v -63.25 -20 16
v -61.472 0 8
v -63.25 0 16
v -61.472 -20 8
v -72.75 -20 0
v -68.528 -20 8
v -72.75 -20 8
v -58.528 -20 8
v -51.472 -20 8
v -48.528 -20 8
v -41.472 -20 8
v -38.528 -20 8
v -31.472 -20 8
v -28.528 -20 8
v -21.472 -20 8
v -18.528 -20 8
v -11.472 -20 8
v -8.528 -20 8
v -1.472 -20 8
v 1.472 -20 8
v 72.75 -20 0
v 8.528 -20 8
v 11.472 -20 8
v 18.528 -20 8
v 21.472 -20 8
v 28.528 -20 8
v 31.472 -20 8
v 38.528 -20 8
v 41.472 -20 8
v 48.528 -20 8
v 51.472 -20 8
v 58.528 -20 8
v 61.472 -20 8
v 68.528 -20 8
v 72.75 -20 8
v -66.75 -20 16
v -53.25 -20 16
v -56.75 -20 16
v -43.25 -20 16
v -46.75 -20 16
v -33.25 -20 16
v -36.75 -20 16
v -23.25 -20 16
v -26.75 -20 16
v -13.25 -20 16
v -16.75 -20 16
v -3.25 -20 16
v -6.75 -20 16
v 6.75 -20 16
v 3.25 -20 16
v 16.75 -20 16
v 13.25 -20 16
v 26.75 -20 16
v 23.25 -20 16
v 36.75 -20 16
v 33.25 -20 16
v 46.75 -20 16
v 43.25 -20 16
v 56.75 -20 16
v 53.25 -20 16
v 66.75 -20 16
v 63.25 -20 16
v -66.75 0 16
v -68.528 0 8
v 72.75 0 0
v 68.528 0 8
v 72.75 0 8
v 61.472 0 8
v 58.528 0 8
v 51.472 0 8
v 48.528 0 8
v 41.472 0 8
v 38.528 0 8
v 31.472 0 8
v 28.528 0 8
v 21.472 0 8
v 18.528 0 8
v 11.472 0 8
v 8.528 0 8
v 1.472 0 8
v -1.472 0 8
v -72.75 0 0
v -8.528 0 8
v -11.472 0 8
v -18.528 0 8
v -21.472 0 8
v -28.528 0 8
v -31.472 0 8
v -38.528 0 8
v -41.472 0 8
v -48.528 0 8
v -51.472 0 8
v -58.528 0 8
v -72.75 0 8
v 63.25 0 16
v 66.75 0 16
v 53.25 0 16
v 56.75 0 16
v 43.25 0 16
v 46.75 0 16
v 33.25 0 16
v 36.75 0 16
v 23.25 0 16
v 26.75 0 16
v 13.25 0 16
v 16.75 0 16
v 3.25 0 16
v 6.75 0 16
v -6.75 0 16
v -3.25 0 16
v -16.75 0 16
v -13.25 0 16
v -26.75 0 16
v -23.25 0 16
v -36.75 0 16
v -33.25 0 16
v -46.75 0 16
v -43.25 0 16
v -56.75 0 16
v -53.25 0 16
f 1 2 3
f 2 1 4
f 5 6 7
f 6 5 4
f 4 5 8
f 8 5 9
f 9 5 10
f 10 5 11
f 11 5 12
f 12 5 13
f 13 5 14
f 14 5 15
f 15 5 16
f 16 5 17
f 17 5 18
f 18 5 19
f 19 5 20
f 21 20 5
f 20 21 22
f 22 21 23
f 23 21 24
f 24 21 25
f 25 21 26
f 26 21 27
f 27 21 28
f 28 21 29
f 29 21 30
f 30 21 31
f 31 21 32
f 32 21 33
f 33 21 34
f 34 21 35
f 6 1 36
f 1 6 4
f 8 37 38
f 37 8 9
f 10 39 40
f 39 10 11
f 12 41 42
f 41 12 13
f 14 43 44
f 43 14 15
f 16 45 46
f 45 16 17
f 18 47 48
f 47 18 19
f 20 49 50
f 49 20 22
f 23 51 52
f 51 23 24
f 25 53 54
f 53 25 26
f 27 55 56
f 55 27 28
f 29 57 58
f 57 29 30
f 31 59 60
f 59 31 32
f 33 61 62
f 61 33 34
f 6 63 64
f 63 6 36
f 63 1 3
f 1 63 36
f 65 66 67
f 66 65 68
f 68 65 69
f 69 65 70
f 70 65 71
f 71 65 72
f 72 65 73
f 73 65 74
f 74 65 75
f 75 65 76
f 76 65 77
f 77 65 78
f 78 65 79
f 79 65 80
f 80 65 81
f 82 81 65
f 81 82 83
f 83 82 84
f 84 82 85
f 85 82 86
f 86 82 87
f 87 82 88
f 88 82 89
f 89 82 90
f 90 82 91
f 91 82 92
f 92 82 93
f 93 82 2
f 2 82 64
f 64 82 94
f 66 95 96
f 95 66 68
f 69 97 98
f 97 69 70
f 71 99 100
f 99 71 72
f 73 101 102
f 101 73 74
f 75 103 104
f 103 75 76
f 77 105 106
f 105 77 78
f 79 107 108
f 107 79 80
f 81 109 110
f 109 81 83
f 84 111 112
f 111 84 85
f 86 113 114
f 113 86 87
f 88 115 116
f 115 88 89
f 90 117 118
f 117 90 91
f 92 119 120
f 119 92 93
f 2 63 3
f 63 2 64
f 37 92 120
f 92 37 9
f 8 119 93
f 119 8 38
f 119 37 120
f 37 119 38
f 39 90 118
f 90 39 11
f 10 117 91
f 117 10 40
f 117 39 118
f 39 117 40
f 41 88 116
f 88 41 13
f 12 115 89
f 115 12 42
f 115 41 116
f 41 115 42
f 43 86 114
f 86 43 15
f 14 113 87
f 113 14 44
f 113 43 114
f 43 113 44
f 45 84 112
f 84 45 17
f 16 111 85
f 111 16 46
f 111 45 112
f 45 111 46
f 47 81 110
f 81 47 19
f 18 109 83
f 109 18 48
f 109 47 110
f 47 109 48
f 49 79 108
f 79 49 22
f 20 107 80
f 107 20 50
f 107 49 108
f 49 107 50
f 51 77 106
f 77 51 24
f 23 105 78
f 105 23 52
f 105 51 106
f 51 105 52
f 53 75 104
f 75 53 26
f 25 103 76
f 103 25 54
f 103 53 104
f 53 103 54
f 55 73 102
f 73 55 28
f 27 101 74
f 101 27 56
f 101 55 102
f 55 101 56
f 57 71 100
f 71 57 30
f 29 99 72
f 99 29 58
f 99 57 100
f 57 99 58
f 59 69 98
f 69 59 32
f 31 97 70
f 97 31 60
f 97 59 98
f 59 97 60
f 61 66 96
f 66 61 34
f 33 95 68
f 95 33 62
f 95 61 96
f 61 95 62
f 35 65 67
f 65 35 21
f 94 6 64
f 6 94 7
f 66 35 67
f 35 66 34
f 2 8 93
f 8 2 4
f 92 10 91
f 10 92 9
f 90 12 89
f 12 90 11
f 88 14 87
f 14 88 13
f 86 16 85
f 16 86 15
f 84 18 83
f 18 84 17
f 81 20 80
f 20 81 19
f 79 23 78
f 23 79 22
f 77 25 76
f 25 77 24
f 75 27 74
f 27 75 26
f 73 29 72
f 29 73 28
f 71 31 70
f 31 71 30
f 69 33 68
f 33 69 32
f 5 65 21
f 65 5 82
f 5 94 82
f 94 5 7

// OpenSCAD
$fn = 32;

// ----------------------------------------------------------------------
// Toothed rack, 14 teeth
// 10 mm pitch, 8 mm teeth
// ----------------------------------------------------------------------

// --- parameters (mm) ---
bar_w = 20;     // bar width (Y)
bar_h = 8;      // bar height (Z)
teeth = 14;     // number of teeth
pitch = 10;     // tooth pitch
tooth_h = 8;    // tooth height above the bar
root_w = 7.5;   // tooth width at the root
crest_w = 3.5;  // tooth width at the crest

// --- derived feature positions (mm) ---
span = (teeth - 1) * pitch;  // = 130   distance between the outer teeth
bar_l = span + root_w + 8;   // = 145.5   bar length: teeth plus 4 mm at each end
tooth_x = -span / 2;         // = -65   X of the first tooth
height = bar_h + tooth_h;    // = 16   overall height
feature_centers = [
  [tooth_x + 0 * pitch, -bar_w / 2],
  [tooth_x + 1 * pitch, -bar_w / 2],
  [tooth_x + 2 * pitch, -bar_w / 2],
  [tooth_x + 3 * pitch, -bar_w / 2],
  [tooth_x + 4 * pitch, -bar_w / 2],
  [tooth_x + 5 * pitch, -bar_w / 2],
  [tooth_x + 6 * pitch, -bar_w / 2],
  [tooth_x + 7 * pitch, -bar_w / 2],
  [tooth_x + 8 * pitch, -bar_w / 2],
  [tooth_x + 9 * pitch, -bar_w / 2],
  [tooth_x + 10 * pitch, -bar_w / 2],
  [tooth_x + 11 * pitch, -bar_w / 2],
  [tooth_x + 12 * pitch, -bar_w / 2],
  [tooth_x + 13 * pitch, -bar_w / 2]
];   // tooth centre line, drives the tooth loop

// bar with a rack of teeth, one extruded trapezoium per centre
module rack_tooth() {
  linear_extrude(height = bar_w)
    polygon(points = [
      [0, 0],
      [root_w, 0],
      [root_w / 2 + crest_w / 2, tooth_h + 1],
      [root_w / 2 - crest_w / 2, tooth_h + 1]
    ]);
}

union() {
  translate([-bar_l / 2, -bar_w, 0]) cube([bar_l, bar_w, bar_h]);
  for (centre = feature_centers)
    translate([centre[0] - root_w / 2, 0, bar_h - 1]) rotate([90, 0, 0]) rack_tooth();
}
